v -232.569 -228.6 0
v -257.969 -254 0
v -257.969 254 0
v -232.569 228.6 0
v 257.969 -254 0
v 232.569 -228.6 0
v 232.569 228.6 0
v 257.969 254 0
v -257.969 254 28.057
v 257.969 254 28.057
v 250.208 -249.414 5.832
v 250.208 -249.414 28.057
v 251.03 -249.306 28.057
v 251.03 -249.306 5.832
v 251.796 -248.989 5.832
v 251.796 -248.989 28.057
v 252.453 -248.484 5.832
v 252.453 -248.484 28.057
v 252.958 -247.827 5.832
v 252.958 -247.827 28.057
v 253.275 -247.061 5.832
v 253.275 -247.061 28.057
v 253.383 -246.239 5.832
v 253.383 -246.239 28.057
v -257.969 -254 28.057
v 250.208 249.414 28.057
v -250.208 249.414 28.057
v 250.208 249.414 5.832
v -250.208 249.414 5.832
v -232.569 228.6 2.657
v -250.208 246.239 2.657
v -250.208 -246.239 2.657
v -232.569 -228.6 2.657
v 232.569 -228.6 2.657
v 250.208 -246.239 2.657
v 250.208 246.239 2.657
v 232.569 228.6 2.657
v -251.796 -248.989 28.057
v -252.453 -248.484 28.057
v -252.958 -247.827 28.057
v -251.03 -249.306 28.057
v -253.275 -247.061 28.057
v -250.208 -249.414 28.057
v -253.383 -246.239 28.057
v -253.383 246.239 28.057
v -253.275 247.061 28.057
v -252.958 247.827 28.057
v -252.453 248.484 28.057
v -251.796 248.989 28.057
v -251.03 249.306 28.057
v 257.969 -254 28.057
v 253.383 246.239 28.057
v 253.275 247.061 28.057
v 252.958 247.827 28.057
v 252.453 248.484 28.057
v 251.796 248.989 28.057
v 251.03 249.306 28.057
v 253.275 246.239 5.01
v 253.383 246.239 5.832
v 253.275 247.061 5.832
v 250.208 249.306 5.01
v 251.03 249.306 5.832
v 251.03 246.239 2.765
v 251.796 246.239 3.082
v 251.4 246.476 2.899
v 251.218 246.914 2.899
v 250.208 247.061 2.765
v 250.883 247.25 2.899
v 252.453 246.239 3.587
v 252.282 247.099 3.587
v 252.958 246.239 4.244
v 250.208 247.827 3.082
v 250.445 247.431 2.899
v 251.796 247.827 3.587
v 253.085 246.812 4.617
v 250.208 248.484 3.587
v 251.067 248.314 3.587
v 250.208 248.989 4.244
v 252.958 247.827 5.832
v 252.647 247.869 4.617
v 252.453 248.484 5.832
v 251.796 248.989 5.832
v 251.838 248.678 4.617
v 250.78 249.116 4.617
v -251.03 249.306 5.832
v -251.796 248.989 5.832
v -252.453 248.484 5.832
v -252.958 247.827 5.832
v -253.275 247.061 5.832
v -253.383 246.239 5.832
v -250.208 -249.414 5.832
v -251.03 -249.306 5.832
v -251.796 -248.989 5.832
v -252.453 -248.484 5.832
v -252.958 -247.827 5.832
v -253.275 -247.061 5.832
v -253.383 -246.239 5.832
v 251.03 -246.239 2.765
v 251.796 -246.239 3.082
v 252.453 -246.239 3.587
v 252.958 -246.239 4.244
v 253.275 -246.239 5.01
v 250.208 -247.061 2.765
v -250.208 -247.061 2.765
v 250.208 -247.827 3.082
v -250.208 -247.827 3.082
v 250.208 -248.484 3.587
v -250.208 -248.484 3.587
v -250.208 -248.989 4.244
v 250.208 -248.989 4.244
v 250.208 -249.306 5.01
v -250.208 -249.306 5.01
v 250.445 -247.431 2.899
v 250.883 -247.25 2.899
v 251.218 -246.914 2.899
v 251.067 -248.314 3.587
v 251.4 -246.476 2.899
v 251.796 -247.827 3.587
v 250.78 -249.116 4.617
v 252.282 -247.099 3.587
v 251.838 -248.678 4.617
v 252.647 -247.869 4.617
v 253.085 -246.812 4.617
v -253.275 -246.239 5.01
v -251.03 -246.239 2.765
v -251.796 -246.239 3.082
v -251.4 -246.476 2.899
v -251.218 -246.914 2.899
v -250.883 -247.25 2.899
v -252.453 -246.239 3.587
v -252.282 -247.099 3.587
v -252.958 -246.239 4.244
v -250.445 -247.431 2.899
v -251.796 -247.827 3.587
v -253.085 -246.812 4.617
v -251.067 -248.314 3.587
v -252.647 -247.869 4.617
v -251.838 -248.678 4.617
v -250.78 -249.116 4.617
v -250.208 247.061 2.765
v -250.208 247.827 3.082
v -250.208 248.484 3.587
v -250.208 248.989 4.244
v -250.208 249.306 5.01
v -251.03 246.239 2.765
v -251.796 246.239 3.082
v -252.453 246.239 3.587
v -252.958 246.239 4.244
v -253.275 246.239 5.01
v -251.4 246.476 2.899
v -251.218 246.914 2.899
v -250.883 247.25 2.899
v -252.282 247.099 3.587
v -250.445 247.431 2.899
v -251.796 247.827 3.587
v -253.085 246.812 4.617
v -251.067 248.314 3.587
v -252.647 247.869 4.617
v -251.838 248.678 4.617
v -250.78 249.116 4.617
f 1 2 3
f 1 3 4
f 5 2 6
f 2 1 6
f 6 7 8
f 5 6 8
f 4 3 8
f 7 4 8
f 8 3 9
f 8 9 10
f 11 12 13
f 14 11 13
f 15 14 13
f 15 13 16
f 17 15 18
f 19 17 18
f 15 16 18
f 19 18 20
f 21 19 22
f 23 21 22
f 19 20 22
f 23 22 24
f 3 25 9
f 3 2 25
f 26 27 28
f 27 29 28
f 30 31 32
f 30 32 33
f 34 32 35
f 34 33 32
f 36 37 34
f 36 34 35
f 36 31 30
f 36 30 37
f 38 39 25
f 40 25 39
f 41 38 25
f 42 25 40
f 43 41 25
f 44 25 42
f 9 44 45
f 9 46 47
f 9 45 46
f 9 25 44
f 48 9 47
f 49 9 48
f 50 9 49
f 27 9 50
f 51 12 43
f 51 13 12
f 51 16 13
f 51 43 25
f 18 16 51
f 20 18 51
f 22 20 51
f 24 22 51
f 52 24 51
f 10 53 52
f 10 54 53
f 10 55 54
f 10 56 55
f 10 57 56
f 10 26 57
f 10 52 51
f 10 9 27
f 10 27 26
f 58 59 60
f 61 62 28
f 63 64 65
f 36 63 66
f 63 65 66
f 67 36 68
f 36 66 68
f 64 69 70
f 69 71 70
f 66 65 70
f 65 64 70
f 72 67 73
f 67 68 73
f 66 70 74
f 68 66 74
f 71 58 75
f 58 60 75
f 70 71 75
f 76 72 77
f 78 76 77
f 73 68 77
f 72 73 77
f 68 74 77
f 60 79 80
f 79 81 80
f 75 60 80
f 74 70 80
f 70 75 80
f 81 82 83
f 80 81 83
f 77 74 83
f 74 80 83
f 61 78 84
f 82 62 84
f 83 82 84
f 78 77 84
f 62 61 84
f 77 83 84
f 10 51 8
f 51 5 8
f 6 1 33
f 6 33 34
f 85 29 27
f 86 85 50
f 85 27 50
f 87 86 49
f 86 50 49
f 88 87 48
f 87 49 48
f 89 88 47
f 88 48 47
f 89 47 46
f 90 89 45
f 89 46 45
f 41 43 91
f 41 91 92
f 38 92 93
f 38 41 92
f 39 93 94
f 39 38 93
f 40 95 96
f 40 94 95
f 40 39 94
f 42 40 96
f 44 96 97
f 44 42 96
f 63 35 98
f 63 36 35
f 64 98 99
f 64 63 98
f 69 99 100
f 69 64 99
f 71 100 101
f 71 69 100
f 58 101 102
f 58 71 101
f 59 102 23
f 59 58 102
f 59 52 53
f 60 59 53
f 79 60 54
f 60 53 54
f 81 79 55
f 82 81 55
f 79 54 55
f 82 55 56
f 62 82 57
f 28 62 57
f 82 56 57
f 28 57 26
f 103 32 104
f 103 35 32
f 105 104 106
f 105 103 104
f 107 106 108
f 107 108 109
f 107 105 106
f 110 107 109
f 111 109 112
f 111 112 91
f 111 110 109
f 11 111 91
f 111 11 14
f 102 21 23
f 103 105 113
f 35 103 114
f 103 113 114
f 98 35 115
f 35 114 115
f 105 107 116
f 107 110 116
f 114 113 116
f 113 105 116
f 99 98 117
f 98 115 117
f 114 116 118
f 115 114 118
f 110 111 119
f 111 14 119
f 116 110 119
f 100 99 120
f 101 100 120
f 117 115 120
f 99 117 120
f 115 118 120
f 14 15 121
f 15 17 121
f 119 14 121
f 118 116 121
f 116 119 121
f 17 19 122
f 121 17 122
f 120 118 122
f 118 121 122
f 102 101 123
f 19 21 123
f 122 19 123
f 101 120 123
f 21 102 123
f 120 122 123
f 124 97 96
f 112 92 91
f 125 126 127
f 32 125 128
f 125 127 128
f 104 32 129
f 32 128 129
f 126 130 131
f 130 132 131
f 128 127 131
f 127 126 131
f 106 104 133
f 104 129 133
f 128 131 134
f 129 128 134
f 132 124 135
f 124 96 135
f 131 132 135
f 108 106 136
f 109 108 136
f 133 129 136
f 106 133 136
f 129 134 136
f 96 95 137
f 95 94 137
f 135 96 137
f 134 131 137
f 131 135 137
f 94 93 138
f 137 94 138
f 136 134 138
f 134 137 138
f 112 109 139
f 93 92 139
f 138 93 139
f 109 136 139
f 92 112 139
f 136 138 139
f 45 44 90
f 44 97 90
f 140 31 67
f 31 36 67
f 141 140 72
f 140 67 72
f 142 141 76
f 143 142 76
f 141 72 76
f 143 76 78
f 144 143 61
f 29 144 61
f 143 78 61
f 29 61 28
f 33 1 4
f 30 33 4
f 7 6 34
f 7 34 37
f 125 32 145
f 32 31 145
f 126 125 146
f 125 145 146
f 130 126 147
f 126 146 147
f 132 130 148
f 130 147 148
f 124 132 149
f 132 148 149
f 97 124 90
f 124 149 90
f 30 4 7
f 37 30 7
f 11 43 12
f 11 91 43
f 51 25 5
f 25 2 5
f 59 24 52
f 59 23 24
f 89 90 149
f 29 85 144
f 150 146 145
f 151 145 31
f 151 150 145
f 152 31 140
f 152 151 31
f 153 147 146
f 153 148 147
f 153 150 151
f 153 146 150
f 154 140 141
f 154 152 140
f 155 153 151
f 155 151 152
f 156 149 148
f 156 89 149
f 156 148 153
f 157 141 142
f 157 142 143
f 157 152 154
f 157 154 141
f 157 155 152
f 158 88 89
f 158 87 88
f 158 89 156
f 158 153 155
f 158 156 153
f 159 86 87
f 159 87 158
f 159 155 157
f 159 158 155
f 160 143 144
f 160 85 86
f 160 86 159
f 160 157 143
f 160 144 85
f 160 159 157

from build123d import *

# Parameters (mm, degrees)
SKETCH1_W        = 515.9375
SKETCH1_H        = 508
SKETCH1_W_2      = 465.1375
SKETCH1_H_2      = 457.2
EXTRUSION1_DEPTH = 2.65684
SKETCH2_W        = 515.9375
SKETCH2_H        = 508
SKETCH2_W_2      = 506.766296236
SKETCH2_H_2      = 498.828796236
EXTRUSION2_DEPTH = 25.4
FILLET1_R        = 3.175


with BuildPart() as part:
    # Sketch1 → Extrusion1 (new body)
    with BuildSketch(Plane.XY):
        Rectangle(SKETCH1_W, SKETCH1_H)
        Rectangle(SKETCH1_W_2, SKETCH1_H_2, mode=Mode.SUBTRACT)
    extrude(amount=EXTRUSION1_DEPTH)

    # Sketch2 → Extrusion2 (add)
    with BuildSketch(Plane.XY.offset(2.65684)):
        Rectangle(SKETCH2_W, SKETCH2_H)
        Rectangle(SKETCH2_W_2, SKETCH2_H_2, mode=Mode.SUBTRACT)
    extrude(amount=EXTRUSION2_DEPTH)

    # Fillet1
    fillet1_edges = [part.edges().sort_by_distance(p)[0] for p in [
        (-253.383148118, -249.414398118, 15.35684),
        (-253.383148118, 249.414398118, 15.35684),
        (253.383148118, 249.414398118, 15.35684),
        (253.383148118, -249.414398118, 15.35684),
        (-253.383148118, 0, 2.65684),
        (0, -249.414398118, 2.65684),
        (253.383148118, 0, 2.65684),
        (0, 249.414398118, 2.65684),
    ]]
    fillet(fillet1_edges, radius=FILLET1_R)


solid = part.part
